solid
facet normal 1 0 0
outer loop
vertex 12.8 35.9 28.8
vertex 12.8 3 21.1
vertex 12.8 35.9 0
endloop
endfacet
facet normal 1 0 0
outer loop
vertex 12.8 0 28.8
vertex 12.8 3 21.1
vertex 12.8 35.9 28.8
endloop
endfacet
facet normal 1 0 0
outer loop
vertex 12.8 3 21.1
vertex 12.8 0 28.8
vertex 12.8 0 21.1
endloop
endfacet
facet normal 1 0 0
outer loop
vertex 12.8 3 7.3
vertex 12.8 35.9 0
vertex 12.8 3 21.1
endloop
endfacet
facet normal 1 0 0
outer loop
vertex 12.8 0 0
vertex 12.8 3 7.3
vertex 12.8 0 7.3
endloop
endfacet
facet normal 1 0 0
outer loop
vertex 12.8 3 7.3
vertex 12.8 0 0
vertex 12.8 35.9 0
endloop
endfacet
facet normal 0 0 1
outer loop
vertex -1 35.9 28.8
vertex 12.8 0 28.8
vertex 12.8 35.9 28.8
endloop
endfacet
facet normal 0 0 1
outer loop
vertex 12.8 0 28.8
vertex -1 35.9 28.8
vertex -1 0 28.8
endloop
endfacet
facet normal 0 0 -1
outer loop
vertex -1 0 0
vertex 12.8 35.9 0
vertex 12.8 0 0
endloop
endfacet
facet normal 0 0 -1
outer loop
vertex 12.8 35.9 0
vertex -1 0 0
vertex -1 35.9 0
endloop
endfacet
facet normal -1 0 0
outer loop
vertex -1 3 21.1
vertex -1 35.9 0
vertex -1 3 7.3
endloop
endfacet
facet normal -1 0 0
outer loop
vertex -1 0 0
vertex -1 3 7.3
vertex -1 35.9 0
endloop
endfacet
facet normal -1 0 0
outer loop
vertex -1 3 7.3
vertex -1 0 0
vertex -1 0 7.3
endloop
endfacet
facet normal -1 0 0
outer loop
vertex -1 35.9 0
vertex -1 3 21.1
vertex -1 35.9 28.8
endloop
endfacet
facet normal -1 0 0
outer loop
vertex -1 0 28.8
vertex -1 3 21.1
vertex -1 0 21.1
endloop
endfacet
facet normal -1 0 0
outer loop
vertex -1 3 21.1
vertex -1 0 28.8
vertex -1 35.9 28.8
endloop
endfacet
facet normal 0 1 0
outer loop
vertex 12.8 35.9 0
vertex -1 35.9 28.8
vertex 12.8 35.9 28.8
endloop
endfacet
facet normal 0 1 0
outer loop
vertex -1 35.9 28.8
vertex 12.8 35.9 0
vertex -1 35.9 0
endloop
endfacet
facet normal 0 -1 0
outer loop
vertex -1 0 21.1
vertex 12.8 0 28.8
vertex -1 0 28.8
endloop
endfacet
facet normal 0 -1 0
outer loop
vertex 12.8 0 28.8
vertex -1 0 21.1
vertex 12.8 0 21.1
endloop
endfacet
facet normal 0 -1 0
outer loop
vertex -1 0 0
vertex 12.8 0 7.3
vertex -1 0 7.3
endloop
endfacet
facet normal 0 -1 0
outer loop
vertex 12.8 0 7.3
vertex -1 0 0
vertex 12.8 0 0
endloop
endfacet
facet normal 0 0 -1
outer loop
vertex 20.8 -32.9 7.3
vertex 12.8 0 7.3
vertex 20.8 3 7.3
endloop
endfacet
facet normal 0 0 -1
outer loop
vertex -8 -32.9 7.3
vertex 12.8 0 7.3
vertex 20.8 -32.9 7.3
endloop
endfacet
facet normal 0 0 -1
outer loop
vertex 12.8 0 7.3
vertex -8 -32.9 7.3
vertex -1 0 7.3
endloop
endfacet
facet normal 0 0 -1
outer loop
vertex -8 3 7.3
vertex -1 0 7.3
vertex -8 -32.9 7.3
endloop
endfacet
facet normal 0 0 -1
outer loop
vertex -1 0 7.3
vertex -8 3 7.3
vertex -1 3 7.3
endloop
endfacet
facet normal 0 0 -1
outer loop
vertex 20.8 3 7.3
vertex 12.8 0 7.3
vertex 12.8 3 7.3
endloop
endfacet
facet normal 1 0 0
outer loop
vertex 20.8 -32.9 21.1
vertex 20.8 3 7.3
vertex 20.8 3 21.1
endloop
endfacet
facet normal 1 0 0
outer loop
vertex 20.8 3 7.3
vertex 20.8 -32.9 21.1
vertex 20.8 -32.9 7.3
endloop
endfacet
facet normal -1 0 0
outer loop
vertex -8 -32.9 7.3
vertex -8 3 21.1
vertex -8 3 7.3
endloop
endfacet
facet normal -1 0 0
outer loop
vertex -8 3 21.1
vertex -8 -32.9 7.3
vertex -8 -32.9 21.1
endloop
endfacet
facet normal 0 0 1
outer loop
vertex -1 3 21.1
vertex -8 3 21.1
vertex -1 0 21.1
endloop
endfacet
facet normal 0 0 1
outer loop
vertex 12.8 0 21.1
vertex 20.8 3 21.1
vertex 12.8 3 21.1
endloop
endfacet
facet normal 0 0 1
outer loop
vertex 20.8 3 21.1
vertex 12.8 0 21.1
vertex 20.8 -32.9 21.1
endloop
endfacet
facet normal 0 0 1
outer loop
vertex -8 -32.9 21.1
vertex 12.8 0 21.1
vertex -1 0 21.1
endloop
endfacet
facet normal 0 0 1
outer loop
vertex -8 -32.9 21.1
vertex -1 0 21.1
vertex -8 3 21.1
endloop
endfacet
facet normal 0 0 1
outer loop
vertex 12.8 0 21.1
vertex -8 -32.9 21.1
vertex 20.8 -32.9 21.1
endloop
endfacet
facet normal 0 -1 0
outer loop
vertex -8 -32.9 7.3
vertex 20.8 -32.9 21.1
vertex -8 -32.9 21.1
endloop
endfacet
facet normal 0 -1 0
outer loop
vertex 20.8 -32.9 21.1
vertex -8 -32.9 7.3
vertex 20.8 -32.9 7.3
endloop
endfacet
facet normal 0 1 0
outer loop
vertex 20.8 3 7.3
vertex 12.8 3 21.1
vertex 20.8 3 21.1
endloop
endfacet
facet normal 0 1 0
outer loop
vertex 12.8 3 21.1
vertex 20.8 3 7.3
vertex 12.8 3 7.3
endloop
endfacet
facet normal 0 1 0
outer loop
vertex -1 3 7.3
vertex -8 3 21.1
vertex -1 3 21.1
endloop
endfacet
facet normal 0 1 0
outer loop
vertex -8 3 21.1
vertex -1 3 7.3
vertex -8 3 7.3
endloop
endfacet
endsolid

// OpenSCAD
/*
Project name: Quadrep for humans
Project url: https://botforhumans.org/projects/quadruped-for-humans
Licence: GNU
Part: Part no#1, Servo wrapper

Author: Bekir Dağ
Author website: https://bekirdag.com
Author email: bekir@piyotecom
*/

$fn = 100;

color("red") translate([-1,0,0]) cube([13.8,35.9,28.8]);
        
translate([-8,-32.9,20.1]) rotate([0,90,0]) color("red") translate([-1,0,0]) cube([13.8,35.9,28.8]);
